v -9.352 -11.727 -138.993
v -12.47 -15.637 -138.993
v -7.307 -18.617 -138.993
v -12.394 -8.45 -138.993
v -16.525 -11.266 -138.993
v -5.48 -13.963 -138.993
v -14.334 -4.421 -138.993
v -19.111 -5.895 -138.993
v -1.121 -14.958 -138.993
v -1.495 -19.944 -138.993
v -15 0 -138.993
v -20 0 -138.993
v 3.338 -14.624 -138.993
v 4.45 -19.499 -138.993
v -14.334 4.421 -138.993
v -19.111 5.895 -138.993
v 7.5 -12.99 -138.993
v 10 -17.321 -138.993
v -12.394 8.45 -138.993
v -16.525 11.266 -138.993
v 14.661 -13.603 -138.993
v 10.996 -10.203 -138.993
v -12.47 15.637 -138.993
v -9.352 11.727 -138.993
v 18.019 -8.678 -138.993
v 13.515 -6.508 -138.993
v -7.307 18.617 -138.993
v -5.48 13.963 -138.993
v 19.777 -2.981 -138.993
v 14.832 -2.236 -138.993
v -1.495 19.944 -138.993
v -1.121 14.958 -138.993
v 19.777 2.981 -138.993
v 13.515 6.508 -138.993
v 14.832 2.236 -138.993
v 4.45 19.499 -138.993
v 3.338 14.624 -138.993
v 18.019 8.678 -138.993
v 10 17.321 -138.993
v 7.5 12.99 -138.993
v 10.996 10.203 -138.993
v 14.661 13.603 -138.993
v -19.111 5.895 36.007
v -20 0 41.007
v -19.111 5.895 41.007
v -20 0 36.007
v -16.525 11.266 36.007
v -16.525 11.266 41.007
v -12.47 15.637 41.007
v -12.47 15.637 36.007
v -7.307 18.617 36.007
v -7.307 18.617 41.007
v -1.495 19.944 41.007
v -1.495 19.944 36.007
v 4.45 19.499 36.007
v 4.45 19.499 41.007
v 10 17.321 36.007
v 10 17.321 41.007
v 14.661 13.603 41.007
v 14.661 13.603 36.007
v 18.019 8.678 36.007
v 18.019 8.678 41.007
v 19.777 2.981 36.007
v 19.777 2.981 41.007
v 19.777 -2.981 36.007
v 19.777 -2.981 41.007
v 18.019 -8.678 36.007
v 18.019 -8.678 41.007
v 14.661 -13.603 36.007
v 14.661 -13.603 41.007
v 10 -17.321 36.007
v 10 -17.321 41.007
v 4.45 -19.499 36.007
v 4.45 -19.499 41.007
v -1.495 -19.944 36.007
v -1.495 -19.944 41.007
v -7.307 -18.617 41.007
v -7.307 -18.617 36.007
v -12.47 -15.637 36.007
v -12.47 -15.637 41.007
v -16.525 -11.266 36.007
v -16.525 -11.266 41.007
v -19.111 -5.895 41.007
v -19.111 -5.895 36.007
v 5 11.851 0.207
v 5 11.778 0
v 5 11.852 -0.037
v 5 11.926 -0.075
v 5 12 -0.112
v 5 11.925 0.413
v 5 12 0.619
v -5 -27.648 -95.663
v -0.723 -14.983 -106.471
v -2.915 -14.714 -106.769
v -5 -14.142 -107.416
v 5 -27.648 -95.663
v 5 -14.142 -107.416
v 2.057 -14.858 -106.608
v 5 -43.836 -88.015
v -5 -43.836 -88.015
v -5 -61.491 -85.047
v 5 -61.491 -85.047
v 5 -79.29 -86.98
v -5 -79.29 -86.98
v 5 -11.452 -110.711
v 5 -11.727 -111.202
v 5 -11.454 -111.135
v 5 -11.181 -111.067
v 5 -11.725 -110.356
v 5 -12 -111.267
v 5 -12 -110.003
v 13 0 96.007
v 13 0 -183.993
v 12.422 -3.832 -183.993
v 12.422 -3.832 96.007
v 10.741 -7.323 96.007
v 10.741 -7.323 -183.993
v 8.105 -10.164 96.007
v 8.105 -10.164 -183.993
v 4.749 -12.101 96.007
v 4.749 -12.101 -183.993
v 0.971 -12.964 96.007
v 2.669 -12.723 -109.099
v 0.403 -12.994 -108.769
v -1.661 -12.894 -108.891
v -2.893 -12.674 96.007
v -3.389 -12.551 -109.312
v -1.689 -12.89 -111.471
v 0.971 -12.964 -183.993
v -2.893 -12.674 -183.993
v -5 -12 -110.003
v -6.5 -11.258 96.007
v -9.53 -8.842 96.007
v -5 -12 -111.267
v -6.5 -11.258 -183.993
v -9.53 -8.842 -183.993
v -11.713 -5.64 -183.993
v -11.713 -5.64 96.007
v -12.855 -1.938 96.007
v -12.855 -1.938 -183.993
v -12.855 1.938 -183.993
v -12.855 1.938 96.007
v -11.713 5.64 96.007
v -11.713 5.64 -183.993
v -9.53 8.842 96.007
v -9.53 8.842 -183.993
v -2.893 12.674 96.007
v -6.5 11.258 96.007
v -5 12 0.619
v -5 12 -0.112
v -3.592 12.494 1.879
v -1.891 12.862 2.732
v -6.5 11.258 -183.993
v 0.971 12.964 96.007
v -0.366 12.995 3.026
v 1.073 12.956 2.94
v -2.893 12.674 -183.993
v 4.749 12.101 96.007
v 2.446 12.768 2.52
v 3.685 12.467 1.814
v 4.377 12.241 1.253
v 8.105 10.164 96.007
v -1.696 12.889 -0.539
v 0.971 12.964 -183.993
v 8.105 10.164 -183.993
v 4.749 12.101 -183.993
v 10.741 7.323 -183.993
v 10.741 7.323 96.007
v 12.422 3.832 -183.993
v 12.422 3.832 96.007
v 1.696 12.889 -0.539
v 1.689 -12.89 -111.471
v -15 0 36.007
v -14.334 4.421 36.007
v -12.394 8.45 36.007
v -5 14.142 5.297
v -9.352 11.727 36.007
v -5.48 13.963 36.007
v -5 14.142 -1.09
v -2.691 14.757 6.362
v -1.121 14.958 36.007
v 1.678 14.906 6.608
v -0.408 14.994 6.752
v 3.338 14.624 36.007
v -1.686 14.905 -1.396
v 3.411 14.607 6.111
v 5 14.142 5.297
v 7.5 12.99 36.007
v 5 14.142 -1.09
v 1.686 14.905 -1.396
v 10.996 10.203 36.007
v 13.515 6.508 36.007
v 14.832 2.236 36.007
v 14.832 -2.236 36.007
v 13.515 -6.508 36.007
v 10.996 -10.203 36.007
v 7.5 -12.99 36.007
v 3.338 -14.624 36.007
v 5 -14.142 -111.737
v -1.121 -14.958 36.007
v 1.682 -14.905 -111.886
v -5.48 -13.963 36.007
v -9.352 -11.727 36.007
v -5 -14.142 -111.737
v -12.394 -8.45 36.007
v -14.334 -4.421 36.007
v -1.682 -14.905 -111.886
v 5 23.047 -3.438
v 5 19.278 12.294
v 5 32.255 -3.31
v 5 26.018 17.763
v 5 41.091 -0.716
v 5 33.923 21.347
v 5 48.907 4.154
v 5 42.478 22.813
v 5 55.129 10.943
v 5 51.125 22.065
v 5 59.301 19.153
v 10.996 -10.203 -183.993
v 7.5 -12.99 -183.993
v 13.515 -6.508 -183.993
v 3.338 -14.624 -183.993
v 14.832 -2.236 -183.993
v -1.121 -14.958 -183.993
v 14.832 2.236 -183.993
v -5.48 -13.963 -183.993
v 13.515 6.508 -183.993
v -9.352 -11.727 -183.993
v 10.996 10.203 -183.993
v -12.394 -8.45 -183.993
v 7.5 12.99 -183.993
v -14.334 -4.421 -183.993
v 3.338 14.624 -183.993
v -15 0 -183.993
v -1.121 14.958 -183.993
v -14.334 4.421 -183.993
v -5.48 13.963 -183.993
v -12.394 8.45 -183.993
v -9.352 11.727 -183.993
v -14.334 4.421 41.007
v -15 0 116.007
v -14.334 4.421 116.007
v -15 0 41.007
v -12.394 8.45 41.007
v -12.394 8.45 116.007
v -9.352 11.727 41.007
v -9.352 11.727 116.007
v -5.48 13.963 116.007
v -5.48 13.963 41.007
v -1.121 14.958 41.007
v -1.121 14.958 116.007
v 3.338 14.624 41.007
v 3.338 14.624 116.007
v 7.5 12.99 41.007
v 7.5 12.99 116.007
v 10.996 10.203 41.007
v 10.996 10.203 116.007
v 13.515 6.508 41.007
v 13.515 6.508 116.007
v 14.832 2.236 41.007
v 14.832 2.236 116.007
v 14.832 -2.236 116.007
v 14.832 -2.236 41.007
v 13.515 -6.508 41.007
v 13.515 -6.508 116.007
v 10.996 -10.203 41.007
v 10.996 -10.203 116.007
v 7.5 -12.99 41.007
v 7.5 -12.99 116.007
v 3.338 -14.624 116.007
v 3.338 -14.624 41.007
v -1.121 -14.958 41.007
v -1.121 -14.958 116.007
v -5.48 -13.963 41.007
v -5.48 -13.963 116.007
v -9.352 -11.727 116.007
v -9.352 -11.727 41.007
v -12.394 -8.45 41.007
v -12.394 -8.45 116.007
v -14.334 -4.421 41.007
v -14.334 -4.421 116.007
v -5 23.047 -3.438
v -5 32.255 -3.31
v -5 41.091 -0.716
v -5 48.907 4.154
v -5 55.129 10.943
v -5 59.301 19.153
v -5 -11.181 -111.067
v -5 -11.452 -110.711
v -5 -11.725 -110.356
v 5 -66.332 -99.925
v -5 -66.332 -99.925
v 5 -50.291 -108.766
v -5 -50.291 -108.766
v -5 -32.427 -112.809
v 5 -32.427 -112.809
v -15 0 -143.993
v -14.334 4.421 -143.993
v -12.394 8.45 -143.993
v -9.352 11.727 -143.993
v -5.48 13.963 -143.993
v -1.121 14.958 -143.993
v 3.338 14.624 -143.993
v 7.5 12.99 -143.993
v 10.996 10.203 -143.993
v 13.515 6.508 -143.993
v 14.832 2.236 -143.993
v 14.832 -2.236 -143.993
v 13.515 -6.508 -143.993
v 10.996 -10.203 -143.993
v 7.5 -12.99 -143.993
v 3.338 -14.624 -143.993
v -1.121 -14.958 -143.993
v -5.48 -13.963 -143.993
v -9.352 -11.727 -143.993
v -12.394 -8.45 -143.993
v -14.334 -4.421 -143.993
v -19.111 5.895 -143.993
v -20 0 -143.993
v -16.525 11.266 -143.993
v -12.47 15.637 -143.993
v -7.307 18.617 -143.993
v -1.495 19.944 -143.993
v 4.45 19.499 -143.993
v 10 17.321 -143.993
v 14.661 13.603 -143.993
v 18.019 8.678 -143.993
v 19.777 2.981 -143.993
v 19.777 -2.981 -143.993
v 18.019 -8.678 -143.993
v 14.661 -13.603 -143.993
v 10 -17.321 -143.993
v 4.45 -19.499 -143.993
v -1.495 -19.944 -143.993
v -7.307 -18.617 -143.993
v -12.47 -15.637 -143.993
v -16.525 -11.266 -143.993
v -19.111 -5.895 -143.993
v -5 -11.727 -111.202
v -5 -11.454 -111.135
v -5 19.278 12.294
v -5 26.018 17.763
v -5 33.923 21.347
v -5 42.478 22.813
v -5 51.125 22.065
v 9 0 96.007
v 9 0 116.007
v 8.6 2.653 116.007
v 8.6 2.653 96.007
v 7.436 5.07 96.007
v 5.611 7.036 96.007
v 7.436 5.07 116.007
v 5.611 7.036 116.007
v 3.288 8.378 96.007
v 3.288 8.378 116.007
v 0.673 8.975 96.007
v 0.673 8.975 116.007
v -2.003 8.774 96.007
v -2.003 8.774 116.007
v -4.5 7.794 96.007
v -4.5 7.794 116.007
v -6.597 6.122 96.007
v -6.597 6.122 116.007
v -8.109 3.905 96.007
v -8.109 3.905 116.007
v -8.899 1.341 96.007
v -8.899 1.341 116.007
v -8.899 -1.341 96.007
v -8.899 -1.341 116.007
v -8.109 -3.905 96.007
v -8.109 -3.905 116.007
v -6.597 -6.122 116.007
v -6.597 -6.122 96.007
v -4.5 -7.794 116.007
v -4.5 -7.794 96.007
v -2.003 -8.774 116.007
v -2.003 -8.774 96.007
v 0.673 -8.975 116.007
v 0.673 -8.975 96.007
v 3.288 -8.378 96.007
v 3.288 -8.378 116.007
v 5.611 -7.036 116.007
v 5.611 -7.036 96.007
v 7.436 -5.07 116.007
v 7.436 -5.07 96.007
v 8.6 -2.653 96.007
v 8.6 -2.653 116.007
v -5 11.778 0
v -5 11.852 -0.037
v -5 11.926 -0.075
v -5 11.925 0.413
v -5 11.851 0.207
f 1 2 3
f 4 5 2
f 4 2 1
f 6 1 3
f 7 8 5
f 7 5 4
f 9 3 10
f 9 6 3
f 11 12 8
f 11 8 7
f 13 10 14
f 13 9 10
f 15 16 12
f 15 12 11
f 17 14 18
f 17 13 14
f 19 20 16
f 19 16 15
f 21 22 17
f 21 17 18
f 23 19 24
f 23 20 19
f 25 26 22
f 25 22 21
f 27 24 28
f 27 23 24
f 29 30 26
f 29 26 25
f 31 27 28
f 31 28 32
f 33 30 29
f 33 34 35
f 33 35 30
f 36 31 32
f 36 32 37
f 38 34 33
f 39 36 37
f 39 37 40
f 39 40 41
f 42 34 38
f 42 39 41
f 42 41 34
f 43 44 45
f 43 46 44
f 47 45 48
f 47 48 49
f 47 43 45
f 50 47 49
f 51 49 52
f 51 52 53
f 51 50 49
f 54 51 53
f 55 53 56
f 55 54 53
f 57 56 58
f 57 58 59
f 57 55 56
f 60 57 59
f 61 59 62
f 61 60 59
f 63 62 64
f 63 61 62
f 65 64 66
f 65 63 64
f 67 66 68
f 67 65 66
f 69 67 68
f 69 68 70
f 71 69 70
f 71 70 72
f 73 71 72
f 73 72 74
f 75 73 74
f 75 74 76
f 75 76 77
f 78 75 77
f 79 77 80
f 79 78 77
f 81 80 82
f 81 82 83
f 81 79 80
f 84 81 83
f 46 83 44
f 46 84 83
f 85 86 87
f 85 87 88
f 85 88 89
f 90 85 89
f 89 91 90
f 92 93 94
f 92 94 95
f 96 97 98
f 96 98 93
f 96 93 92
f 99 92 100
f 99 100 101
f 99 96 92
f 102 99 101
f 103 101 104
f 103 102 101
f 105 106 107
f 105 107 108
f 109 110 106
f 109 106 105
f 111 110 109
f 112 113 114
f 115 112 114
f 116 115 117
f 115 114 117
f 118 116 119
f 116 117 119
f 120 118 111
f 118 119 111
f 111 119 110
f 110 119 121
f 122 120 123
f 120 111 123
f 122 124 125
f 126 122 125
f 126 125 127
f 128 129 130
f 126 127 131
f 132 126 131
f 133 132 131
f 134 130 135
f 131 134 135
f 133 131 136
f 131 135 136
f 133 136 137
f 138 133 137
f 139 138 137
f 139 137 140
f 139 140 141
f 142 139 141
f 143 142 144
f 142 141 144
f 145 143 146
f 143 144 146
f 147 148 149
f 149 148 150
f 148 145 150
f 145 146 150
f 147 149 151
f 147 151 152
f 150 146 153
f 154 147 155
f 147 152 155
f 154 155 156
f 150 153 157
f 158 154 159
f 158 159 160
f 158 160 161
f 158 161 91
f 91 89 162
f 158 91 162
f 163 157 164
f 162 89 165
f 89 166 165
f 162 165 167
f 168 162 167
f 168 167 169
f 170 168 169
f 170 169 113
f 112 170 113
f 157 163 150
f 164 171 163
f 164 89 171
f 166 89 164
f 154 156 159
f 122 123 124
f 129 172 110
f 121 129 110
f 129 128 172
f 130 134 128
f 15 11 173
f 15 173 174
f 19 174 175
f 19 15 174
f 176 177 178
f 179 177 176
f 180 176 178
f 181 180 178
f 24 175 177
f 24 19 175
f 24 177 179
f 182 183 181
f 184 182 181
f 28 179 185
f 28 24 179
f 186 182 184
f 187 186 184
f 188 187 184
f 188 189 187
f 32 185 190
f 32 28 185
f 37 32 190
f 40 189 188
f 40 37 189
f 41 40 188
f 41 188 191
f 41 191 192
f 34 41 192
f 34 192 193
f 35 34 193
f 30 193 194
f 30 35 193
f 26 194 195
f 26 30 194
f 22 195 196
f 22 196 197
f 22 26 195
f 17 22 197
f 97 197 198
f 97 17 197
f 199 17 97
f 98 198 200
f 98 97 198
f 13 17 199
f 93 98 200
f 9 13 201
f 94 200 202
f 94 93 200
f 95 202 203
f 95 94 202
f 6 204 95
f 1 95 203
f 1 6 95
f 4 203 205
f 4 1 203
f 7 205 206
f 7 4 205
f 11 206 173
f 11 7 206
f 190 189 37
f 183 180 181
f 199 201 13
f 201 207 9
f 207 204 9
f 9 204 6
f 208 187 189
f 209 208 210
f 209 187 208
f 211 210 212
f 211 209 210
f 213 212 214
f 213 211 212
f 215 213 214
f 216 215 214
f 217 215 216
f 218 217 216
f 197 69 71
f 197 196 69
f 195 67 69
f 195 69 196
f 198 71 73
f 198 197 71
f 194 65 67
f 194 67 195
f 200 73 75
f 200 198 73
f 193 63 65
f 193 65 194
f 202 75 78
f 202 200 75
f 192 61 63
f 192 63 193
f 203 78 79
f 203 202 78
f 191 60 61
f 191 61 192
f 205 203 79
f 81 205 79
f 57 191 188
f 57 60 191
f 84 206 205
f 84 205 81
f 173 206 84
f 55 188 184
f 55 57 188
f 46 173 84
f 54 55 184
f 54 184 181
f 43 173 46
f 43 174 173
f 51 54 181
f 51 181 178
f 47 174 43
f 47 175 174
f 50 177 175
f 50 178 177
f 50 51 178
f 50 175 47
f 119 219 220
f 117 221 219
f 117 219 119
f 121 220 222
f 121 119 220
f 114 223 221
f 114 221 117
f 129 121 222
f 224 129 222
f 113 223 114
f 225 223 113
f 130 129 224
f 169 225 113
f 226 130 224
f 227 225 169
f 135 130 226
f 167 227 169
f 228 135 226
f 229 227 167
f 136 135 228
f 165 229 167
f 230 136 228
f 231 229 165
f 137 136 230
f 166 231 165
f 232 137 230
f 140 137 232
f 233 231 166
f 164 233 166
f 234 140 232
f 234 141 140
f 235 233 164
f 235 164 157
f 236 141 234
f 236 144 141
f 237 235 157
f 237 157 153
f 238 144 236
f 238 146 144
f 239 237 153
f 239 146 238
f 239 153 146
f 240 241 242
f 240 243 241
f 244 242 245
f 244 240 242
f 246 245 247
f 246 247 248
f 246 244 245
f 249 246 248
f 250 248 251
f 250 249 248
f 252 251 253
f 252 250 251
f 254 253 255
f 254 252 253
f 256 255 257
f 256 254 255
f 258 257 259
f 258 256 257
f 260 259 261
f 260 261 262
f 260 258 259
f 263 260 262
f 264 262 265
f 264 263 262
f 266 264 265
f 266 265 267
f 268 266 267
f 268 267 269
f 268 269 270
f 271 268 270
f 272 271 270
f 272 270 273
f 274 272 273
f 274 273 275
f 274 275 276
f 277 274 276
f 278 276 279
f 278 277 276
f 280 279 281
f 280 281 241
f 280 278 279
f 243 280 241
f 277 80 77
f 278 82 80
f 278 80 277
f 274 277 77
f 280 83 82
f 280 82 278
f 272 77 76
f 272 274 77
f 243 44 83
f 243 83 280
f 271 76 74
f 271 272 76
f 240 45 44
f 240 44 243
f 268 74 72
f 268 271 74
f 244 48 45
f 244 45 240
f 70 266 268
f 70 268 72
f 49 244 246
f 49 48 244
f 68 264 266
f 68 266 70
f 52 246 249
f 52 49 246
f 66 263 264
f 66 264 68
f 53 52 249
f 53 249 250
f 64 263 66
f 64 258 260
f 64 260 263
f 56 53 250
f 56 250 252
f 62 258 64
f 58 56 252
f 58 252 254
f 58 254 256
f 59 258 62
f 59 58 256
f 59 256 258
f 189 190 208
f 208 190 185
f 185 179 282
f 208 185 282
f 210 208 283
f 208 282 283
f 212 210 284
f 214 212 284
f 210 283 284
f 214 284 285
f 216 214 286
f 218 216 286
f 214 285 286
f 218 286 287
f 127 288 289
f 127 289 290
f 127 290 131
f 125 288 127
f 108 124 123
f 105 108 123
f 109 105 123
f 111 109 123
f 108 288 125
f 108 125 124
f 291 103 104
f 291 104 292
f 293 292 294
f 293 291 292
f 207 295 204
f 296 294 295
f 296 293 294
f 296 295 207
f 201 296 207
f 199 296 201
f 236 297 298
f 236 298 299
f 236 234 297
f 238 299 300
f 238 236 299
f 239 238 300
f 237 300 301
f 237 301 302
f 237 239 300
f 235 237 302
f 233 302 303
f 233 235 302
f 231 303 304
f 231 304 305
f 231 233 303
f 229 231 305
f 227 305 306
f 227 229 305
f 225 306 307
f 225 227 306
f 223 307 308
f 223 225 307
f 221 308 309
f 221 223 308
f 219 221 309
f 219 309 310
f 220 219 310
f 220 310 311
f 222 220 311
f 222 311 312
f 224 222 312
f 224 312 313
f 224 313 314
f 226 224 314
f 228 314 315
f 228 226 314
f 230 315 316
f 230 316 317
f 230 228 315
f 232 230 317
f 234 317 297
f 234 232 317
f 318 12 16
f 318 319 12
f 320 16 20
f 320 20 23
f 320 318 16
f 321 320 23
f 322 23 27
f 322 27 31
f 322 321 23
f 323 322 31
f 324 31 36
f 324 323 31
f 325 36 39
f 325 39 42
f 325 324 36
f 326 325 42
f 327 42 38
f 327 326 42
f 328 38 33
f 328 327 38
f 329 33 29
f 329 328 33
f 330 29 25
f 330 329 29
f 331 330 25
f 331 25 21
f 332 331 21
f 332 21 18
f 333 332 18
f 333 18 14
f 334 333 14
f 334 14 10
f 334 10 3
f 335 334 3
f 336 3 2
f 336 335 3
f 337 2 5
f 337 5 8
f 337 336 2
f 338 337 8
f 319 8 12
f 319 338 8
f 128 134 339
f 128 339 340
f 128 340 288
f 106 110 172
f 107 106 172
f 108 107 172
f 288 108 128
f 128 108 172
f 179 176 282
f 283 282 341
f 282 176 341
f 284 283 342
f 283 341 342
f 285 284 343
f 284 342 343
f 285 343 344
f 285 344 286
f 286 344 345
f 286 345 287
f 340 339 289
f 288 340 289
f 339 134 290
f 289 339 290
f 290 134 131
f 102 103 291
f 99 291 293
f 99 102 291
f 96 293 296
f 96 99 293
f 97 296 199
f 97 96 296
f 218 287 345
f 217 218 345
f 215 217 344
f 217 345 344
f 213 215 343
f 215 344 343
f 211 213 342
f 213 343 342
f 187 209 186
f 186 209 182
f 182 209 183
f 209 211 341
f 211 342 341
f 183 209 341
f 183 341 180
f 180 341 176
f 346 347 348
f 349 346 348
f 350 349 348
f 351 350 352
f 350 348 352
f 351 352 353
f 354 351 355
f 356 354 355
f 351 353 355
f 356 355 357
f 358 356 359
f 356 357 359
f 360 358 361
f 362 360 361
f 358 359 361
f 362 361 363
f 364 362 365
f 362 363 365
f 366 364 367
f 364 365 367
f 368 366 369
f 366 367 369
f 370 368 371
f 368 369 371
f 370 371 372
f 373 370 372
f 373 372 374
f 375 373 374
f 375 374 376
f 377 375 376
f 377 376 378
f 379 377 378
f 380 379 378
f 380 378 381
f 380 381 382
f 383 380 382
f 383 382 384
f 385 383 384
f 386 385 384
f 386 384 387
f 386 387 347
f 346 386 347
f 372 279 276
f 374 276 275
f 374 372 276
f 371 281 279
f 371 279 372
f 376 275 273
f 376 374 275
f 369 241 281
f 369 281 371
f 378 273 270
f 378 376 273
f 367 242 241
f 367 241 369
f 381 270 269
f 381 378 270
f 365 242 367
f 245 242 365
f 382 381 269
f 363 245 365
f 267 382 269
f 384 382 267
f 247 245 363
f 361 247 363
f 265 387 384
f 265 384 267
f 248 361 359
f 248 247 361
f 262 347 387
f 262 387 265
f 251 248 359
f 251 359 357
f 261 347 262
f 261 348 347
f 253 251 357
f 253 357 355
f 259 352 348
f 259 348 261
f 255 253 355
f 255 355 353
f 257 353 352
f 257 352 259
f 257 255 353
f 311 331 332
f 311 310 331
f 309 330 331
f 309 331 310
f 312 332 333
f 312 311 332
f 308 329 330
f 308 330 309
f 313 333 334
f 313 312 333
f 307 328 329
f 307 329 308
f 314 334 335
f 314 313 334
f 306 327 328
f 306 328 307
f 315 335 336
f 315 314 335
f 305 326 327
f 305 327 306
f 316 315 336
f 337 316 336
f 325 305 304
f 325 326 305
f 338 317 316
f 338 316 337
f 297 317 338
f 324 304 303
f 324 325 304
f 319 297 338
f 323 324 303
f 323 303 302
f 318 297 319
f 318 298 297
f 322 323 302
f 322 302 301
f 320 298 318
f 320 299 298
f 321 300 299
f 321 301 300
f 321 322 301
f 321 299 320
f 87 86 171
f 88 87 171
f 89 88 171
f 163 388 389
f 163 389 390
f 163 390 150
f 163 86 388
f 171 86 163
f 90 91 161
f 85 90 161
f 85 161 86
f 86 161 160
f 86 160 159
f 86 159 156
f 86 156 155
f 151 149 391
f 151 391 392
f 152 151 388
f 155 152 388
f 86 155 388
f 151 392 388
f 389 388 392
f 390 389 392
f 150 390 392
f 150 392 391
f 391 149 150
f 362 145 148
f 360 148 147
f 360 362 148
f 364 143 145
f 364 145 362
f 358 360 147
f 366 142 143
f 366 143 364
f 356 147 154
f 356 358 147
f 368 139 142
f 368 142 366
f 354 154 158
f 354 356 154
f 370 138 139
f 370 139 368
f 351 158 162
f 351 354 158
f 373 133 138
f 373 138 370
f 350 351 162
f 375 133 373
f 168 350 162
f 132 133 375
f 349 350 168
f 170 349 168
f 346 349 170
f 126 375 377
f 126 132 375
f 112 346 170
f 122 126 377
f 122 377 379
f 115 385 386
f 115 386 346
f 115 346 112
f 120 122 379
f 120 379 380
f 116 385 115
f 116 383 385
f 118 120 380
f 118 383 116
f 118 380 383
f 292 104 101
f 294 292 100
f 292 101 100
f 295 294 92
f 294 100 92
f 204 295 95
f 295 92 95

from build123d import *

# Parameters (mm, degrees)
F2_R     = 13
F3_DEPTH = 280
F4_R     = 9
F5_DEPTH = 25
F7_DEPTH = 5


with BuildPart() as f1:
    # F0 (on Front) → F1 (revolve)
    with BuildSketch(Plane.XZ):
        Polygon((0, 41.006801), (0, 116.006801), (-15, 116.006801), (-15, 41.006801), (-20, 41.006801), (-20, 36.006801), (-15, 36.006801), (-15, -138.993199), (-20, -138.993199), (-20, -143.993199), (-15, -143.993199), (-15, -183.993199), (0, -183.993199), (0, -143.993199), (0, -138.993199), (0, 36.006801), align=None)
    revolve(axis=Axis((0, 0, -33.993199), (0, 0, -1)))

    # F2 (on face) → F3 (cut)
    with BuildSketch(Plane(origin=(0, 0, -183.993199), x_dir=(1, 0, 0), z_dir=(0, 0, -1))):
        Circle(F2_R)
    extrude(amount=-F3_DEPTH, mode=Mode.SUBTRACT)

    # F4 (on face) → F5 (cut)
    with BuildSketch(Plane.XY.offset(116.006801)):
        Circle(F4_R)
    extrude(amount=-F5_DEPTH, mode=Mode.SUBTRACT)

    # F6 (on Right) → F7 (join, symmetric)
    with BuildSketch(Plane.YZ):
        with BuildLine():
            ThreePointArc((11.778281, 0), (39.893063, -1.22572), (59.301081, 19.152508))
            ThreePointArc((59.301081, 19.152508), (31.186299, 20.378228), (11.778281, 0))
        make_face()
        with BuildLine():
            ThreePointArc((-11.181168, -111.06737), (-41.605309, -88.759159), (-79.289787, -86.980172))
            ThreePointArc((-79.289787, -86.980172), (-48.865646, -109.288382), (-11.181168, -111.06737))
        make_face()
    extrude(amount=F7_DEPTH, both=True)


solid = f1.part
